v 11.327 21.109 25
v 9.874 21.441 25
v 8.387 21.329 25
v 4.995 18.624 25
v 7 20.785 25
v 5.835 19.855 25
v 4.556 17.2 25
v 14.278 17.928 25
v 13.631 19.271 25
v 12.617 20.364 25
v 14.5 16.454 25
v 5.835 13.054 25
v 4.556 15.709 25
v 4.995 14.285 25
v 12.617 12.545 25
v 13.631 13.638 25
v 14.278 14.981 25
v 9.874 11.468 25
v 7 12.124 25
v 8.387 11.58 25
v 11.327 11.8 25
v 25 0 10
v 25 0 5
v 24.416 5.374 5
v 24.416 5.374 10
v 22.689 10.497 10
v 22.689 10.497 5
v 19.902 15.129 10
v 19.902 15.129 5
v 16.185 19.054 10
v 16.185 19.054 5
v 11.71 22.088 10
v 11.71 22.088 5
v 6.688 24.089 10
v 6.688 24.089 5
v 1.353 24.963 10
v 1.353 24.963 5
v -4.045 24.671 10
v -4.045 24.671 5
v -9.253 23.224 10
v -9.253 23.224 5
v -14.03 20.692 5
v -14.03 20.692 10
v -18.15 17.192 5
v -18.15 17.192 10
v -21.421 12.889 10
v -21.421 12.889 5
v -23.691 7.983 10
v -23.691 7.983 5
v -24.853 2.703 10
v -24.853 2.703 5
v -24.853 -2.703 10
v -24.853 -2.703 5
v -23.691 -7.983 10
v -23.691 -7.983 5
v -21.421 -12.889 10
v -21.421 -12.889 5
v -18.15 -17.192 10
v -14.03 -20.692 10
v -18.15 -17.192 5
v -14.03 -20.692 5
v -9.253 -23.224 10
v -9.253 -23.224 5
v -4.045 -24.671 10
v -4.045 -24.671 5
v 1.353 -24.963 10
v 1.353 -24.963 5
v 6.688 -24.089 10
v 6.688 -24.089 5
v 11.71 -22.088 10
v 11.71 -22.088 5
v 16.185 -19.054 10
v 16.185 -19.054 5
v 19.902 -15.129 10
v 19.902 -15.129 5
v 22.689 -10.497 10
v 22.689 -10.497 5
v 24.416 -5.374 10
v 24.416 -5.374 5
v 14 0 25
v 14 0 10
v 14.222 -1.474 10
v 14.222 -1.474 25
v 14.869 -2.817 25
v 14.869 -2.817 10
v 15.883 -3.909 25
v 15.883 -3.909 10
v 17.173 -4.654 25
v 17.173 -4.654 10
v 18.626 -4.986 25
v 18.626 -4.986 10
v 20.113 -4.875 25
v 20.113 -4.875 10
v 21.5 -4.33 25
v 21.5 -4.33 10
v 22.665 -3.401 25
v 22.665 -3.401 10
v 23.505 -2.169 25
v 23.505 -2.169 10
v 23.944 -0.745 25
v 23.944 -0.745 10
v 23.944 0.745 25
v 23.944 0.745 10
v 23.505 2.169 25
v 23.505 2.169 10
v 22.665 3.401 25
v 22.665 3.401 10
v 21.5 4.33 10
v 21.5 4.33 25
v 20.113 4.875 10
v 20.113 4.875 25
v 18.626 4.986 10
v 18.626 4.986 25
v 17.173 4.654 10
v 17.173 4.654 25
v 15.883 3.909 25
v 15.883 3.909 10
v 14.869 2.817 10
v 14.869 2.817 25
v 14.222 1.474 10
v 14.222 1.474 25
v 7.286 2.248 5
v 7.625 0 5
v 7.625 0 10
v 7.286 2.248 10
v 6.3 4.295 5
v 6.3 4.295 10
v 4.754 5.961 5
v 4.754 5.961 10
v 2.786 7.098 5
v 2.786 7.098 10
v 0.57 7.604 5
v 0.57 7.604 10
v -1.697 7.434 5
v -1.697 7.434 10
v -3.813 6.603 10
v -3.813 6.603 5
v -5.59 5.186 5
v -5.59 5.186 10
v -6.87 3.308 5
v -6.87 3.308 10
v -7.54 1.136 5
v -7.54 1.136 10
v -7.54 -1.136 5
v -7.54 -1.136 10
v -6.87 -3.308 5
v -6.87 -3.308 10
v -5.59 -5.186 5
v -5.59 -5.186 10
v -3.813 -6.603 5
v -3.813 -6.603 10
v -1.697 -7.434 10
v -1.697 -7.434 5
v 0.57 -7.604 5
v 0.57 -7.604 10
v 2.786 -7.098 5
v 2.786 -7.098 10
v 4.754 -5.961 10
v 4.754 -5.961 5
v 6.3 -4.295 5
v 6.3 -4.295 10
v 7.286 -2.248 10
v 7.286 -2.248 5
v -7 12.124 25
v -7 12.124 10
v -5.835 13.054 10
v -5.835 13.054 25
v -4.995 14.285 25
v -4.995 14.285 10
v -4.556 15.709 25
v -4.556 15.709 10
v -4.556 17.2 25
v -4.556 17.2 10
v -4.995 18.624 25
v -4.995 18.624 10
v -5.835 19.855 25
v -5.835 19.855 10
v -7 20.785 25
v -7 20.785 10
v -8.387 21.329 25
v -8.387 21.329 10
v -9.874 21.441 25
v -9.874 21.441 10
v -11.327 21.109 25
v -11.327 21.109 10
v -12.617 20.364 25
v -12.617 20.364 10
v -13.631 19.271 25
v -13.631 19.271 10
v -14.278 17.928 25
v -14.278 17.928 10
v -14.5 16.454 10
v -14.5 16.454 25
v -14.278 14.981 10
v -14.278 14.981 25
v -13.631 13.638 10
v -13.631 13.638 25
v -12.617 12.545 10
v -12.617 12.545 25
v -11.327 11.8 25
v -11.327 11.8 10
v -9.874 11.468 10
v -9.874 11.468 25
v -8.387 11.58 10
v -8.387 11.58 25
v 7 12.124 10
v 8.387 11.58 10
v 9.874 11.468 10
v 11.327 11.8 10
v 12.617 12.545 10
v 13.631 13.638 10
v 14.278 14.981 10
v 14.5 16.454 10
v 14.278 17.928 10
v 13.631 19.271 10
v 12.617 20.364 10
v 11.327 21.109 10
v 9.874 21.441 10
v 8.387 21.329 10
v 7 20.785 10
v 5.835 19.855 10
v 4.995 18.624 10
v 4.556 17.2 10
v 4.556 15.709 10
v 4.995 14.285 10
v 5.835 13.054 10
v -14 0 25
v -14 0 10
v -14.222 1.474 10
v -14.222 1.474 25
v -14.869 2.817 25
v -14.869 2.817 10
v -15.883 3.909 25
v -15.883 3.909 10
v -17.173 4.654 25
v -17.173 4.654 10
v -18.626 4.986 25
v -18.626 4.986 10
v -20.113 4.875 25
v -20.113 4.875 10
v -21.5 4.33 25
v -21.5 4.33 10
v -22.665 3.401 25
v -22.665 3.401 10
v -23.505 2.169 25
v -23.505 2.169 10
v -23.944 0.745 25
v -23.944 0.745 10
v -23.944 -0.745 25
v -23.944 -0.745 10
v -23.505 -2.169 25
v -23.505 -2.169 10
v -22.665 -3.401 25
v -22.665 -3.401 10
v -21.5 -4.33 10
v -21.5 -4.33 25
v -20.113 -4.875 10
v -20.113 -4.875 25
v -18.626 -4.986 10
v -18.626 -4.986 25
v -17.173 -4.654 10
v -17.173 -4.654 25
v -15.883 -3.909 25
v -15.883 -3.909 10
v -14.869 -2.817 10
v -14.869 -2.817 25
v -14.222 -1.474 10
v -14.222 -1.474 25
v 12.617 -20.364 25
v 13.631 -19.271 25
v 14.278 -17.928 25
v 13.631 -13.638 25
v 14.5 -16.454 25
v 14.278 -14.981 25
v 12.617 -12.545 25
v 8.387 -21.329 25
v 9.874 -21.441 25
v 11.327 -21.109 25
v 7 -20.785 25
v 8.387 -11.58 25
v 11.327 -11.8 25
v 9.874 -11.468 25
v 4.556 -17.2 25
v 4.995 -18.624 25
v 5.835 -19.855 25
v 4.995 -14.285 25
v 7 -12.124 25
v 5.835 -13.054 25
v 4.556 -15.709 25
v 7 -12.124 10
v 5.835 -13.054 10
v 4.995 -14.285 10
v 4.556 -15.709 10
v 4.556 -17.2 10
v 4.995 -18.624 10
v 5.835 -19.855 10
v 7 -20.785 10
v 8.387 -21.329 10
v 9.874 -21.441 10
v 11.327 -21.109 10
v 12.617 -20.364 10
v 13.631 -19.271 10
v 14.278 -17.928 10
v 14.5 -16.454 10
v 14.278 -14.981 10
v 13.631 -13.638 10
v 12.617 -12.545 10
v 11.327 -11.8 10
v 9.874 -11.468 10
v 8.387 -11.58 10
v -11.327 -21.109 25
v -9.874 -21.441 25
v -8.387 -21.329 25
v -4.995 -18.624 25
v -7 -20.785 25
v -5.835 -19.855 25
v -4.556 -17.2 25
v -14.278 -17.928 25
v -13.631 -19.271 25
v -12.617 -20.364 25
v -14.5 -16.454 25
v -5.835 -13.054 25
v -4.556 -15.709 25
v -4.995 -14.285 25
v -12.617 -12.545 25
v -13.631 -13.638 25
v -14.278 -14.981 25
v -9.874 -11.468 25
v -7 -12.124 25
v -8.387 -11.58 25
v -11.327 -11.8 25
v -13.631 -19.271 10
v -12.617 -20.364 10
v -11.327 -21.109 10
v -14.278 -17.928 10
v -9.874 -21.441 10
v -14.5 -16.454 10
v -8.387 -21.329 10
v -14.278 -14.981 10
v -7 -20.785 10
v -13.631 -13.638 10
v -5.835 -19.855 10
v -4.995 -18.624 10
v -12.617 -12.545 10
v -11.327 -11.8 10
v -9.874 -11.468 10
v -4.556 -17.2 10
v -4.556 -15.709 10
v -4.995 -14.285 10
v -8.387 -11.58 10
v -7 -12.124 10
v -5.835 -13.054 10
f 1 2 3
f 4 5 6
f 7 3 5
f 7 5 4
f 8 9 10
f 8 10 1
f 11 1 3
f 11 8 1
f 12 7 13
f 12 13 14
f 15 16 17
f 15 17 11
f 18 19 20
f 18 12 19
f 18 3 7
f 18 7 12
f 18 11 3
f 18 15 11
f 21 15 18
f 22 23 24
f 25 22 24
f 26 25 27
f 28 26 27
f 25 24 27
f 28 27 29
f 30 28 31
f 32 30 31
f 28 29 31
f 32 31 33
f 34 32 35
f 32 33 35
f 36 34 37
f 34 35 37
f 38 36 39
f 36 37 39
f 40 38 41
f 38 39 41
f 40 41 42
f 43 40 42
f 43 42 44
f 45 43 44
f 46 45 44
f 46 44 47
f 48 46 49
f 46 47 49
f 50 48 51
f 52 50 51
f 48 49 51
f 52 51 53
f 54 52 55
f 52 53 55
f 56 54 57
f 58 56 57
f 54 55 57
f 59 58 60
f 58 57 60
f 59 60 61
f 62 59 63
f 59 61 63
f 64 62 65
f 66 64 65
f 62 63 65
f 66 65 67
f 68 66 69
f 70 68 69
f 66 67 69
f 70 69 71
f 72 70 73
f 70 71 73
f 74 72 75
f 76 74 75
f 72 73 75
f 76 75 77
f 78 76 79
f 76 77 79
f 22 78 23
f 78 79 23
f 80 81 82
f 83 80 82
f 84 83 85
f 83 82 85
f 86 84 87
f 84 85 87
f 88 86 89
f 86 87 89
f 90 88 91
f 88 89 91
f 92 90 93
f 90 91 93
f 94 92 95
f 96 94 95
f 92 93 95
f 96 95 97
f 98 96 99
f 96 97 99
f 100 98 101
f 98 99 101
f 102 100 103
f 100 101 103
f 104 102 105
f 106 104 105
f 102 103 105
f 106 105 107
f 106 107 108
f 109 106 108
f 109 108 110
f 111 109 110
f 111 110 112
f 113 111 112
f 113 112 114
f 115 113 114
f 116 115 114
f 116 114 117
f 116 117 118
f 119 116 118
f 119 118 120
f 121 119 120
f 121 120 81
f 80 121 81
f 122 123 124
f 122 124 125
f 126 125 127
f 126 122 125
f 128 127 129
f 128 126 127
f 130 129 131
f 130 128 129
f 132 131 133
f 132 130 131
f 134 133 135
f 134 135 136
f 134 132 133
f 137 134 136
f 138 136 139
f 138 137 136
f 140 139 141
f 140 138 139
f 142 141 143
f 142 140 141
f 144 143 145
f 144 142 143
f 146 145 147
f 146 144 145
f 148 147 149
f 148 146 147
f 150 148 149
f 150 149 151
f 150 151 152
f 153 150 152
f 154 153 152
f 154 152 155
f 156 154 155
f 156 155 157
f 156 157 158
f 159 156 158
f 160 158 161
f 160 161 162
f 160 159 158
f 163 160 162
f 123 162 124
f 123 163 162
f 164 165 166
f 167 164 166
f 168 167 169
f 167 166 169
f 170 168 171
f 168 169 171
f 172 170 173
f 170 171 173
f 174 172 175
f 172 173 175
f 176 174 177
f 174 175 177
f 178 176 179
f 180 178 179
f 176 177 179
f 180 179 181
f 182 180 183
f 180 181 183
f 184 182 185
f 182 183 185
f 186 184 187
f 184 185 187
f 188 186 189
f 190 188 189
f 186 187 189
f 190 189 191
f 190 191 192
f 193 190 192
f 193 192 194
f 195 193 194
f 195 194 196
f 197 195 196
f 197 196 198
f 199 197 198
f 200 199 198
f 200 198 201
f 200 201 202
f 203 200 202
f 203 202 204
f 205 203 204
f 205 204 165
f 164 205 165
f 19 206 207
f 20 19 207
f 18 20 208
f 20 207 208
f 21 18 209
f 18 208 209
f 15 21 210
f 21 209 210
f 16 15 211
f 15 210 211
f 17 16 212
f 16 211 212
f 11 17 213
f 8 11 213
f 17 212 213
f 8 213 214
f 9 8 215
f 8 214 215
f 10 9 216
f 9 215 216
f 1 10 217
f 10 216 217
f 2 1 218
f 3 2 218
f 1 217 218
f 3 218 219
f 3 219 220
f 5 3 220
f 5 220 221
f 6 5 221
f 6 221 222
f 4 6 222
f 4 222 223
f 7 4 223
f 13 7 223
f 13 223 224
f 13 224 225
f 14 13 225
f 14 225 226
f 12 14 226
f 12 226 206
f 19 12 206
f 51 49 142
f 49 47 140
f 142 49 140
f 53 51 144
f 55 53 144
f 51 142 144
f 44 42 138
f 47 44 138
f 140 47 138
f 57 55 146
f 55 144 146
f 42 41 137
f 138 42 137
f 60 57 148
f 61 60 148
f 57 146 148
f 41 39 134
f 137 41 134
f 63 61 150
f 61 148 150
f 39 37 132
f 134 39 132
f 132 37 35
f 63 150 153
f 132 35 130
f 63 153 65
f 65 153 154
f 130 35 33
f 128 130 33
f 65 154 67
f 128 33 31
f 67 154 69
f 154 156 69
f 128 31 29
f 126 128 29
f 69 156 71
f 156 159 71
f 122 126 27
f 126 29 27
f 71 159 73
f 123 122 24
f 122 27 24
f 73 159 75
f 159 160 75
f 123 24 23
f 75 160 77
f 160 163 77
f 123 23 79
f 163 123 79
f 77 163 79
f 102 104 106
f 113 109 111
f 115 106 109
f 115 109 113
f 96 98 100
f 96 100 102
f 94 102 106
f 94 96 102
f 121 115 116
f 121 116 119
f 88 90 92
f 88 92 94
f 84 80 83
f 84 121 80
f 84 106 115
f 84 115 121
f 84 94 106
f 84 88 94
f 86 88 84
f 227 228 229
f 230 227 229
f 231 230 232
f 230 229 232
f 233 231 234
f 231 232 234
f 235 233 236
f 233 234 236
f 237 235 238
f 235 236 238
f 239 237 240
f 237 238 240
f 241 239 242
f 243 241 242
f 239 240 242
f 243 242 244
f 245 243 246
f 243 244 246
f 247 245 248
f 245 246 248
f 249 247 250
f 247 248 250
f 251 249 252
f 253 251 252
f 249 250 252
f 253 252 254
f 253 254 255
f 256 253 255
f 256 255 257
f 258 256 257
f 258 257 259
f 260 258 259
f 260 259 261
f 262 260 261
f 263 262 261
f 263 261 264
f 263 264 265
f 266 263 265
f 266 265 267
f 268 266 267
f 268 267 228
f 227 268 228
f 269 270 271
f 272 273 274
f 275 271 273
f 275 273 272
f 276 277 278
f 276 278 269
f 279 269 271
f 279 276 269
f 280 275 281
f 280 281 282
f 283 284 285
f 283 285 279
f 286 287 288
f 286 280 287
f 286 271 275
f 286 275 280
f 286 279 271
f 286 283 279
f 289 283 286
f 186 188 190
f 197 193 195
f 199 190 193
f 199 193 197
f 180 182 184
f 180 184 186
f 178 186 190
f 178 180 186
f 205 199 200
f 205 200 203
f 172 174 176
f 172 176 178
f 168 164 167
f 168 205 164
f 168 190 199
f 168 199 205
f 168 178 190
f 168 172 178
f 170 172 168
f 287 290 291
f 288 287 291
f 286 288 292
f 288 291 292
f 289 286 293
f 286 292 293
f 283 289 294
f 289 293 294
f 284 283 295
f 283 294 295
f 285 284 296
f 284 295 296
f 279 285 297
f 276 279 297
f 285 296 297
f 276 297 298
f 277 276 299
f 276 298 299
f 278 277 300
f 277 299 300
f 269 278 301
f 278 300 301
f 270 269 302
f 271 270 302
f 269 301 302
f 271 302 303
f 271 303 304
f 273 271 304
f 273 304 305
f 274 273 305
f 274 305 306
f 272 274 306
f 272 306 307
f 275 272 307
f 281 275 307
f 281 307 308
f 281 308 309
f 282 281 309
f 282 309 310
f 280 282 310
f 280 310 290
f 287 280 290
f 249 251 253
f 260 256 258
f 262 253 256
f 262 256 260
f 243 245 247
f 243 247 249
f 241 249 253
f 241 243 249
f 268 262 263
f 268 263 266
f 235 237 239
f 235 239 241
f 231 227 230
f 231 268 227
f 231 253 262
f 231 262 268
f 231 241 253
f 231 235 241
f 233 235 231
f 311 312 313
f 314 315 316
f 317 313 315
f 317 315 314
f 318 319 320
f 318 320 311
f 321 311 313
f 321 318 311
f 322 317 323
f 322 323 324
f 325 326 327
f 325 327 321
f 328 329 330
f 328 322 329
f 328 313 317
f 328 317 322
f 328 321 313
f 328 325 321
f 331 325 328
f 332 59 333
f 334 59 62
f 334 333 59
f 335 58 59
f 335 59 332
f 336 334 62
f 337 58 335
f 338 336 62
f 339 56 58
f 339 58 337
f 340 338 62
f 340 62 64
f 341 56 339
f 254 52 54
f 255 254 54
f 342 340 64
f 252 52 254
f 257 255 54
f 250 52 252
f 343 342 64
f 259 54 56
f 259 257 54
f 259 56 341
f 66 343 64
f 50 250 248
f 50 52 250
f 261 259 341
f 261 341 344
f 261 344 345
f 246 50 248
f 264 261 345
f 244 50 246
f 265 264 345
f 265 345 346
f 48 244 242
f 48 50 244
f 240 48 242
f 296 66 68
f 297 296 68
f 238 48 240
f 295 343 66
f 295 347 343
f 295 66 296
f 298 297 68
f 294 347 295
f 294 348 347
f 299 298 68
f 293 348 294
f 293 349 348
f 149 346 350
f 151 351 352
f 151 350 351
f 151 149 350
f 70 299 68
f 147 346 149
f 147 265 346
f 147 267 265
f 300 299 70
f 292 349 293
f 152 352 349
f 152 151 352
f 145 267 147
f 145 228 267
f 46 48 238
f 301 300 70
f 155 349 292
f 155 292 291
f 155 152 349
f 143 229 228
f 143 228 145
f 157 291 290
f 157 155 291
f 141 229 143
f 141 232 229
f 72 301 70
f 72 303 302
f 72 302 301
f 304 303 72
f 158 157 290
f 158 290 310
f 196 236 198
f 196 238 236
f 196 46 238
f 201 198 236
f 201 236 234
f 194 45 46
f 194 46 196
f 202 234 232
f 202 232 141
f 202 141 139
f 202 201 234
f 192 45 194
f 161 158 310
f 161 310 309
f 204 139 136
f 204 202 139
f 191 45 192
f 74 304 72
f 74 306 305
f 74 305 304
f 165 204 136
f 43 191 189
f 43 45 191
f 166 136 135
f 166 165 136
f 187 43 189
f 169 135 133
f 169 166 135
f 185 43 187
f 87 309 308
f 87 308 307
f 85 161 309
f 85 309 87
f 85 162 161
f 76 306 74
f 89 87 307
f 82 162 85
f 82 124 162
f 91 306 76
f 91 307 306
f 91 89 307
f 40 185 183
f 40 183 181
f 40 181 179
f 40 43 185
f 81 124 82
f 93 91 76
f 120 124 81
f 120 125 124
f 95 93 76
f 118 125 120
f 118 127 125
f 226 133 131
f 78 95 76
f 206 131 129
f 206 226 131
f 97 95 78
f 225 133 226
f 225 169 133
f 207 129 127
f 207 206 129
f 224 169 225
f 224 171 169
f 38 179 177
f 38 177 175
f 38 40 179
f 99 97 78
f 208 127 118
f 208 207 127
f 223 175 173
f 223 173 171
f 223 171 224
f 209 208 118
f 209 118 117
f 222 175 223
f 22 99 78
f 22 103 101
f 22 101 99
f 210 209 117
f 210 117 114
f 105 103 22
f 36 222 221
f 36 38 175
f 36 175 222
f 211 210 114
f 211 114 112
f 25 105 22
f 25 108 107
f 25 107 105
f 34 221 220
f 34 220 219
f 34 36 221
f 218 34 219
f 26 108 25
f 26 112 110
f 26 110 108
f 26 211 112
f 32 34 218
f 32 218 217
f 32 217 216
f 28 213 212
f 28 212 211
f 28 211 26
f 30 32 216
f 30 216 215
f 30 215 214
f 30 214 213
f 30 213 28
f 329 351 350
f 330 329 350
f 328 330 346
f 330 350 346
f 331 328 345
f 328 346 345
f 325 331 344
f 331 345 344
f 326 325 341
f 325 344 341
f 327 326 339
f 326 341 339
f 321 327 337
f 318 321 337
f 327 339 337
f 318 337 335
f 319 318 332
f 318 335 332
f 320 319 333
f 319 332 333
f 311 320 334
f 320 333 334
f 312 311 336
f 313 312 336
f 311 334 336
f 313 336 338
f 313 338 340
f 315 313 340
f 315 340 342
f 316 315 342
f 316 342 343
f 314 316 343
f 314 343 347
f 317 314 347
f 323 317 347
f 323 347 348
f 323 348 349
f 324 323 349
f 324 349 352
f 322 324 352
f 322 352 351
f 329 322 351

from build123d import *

# Parameters (mm, degrees)
DRIVERDISKBASESKETCH001_R   = 25
DRIVERDISKBASESKETCH001_R_2 = 7.625
PAD_DEPTH                   = 5
DRIVERSHAFTSKETCH_R         = 5
PAD004_DEPTH                = 20
DRIVERDISKPOLAR_COUNT       = 6


with BuildPart() as part:
    # DriverDiskBaseSketch001 → Pad (new body)
    with BuildSketch(Plane.XY):
        Circle(DRIVERDISKBASESKETCH001_R)
        Circle(DRIVERDISKBASESKETCH001_R_2, mode=Mode.SUBTRACT)
    extrude(amount=PAD_DEPTH)

    # DriverShaftSketch → Pad004 (join)
    with BuildSketch(Plane.XY):
        with Locations((-19, 0)):
            Circle(DRIVERSHAFTSKETCH_R)
    pad004 = extrude(amount=PAD004_DEPTH)

    # DriverDiskPolar: Pad004 ×6 about axis
    driverdiskpolar_axis = Axis((0, 0, 0), (0, 0, 1))
    for i in range(1, DRIVERDISKPOLAR_COUNT):
        add(pad004.rotate(driverdiskpolar_axis, i * 360 / DRIVERDISKPOLAR_COUNT))


with BuildPart() as part_1:
    # driverDisk placement: moved
    add(part.part.moved(Location((0, 0, 5))))


solid = part_1.part
